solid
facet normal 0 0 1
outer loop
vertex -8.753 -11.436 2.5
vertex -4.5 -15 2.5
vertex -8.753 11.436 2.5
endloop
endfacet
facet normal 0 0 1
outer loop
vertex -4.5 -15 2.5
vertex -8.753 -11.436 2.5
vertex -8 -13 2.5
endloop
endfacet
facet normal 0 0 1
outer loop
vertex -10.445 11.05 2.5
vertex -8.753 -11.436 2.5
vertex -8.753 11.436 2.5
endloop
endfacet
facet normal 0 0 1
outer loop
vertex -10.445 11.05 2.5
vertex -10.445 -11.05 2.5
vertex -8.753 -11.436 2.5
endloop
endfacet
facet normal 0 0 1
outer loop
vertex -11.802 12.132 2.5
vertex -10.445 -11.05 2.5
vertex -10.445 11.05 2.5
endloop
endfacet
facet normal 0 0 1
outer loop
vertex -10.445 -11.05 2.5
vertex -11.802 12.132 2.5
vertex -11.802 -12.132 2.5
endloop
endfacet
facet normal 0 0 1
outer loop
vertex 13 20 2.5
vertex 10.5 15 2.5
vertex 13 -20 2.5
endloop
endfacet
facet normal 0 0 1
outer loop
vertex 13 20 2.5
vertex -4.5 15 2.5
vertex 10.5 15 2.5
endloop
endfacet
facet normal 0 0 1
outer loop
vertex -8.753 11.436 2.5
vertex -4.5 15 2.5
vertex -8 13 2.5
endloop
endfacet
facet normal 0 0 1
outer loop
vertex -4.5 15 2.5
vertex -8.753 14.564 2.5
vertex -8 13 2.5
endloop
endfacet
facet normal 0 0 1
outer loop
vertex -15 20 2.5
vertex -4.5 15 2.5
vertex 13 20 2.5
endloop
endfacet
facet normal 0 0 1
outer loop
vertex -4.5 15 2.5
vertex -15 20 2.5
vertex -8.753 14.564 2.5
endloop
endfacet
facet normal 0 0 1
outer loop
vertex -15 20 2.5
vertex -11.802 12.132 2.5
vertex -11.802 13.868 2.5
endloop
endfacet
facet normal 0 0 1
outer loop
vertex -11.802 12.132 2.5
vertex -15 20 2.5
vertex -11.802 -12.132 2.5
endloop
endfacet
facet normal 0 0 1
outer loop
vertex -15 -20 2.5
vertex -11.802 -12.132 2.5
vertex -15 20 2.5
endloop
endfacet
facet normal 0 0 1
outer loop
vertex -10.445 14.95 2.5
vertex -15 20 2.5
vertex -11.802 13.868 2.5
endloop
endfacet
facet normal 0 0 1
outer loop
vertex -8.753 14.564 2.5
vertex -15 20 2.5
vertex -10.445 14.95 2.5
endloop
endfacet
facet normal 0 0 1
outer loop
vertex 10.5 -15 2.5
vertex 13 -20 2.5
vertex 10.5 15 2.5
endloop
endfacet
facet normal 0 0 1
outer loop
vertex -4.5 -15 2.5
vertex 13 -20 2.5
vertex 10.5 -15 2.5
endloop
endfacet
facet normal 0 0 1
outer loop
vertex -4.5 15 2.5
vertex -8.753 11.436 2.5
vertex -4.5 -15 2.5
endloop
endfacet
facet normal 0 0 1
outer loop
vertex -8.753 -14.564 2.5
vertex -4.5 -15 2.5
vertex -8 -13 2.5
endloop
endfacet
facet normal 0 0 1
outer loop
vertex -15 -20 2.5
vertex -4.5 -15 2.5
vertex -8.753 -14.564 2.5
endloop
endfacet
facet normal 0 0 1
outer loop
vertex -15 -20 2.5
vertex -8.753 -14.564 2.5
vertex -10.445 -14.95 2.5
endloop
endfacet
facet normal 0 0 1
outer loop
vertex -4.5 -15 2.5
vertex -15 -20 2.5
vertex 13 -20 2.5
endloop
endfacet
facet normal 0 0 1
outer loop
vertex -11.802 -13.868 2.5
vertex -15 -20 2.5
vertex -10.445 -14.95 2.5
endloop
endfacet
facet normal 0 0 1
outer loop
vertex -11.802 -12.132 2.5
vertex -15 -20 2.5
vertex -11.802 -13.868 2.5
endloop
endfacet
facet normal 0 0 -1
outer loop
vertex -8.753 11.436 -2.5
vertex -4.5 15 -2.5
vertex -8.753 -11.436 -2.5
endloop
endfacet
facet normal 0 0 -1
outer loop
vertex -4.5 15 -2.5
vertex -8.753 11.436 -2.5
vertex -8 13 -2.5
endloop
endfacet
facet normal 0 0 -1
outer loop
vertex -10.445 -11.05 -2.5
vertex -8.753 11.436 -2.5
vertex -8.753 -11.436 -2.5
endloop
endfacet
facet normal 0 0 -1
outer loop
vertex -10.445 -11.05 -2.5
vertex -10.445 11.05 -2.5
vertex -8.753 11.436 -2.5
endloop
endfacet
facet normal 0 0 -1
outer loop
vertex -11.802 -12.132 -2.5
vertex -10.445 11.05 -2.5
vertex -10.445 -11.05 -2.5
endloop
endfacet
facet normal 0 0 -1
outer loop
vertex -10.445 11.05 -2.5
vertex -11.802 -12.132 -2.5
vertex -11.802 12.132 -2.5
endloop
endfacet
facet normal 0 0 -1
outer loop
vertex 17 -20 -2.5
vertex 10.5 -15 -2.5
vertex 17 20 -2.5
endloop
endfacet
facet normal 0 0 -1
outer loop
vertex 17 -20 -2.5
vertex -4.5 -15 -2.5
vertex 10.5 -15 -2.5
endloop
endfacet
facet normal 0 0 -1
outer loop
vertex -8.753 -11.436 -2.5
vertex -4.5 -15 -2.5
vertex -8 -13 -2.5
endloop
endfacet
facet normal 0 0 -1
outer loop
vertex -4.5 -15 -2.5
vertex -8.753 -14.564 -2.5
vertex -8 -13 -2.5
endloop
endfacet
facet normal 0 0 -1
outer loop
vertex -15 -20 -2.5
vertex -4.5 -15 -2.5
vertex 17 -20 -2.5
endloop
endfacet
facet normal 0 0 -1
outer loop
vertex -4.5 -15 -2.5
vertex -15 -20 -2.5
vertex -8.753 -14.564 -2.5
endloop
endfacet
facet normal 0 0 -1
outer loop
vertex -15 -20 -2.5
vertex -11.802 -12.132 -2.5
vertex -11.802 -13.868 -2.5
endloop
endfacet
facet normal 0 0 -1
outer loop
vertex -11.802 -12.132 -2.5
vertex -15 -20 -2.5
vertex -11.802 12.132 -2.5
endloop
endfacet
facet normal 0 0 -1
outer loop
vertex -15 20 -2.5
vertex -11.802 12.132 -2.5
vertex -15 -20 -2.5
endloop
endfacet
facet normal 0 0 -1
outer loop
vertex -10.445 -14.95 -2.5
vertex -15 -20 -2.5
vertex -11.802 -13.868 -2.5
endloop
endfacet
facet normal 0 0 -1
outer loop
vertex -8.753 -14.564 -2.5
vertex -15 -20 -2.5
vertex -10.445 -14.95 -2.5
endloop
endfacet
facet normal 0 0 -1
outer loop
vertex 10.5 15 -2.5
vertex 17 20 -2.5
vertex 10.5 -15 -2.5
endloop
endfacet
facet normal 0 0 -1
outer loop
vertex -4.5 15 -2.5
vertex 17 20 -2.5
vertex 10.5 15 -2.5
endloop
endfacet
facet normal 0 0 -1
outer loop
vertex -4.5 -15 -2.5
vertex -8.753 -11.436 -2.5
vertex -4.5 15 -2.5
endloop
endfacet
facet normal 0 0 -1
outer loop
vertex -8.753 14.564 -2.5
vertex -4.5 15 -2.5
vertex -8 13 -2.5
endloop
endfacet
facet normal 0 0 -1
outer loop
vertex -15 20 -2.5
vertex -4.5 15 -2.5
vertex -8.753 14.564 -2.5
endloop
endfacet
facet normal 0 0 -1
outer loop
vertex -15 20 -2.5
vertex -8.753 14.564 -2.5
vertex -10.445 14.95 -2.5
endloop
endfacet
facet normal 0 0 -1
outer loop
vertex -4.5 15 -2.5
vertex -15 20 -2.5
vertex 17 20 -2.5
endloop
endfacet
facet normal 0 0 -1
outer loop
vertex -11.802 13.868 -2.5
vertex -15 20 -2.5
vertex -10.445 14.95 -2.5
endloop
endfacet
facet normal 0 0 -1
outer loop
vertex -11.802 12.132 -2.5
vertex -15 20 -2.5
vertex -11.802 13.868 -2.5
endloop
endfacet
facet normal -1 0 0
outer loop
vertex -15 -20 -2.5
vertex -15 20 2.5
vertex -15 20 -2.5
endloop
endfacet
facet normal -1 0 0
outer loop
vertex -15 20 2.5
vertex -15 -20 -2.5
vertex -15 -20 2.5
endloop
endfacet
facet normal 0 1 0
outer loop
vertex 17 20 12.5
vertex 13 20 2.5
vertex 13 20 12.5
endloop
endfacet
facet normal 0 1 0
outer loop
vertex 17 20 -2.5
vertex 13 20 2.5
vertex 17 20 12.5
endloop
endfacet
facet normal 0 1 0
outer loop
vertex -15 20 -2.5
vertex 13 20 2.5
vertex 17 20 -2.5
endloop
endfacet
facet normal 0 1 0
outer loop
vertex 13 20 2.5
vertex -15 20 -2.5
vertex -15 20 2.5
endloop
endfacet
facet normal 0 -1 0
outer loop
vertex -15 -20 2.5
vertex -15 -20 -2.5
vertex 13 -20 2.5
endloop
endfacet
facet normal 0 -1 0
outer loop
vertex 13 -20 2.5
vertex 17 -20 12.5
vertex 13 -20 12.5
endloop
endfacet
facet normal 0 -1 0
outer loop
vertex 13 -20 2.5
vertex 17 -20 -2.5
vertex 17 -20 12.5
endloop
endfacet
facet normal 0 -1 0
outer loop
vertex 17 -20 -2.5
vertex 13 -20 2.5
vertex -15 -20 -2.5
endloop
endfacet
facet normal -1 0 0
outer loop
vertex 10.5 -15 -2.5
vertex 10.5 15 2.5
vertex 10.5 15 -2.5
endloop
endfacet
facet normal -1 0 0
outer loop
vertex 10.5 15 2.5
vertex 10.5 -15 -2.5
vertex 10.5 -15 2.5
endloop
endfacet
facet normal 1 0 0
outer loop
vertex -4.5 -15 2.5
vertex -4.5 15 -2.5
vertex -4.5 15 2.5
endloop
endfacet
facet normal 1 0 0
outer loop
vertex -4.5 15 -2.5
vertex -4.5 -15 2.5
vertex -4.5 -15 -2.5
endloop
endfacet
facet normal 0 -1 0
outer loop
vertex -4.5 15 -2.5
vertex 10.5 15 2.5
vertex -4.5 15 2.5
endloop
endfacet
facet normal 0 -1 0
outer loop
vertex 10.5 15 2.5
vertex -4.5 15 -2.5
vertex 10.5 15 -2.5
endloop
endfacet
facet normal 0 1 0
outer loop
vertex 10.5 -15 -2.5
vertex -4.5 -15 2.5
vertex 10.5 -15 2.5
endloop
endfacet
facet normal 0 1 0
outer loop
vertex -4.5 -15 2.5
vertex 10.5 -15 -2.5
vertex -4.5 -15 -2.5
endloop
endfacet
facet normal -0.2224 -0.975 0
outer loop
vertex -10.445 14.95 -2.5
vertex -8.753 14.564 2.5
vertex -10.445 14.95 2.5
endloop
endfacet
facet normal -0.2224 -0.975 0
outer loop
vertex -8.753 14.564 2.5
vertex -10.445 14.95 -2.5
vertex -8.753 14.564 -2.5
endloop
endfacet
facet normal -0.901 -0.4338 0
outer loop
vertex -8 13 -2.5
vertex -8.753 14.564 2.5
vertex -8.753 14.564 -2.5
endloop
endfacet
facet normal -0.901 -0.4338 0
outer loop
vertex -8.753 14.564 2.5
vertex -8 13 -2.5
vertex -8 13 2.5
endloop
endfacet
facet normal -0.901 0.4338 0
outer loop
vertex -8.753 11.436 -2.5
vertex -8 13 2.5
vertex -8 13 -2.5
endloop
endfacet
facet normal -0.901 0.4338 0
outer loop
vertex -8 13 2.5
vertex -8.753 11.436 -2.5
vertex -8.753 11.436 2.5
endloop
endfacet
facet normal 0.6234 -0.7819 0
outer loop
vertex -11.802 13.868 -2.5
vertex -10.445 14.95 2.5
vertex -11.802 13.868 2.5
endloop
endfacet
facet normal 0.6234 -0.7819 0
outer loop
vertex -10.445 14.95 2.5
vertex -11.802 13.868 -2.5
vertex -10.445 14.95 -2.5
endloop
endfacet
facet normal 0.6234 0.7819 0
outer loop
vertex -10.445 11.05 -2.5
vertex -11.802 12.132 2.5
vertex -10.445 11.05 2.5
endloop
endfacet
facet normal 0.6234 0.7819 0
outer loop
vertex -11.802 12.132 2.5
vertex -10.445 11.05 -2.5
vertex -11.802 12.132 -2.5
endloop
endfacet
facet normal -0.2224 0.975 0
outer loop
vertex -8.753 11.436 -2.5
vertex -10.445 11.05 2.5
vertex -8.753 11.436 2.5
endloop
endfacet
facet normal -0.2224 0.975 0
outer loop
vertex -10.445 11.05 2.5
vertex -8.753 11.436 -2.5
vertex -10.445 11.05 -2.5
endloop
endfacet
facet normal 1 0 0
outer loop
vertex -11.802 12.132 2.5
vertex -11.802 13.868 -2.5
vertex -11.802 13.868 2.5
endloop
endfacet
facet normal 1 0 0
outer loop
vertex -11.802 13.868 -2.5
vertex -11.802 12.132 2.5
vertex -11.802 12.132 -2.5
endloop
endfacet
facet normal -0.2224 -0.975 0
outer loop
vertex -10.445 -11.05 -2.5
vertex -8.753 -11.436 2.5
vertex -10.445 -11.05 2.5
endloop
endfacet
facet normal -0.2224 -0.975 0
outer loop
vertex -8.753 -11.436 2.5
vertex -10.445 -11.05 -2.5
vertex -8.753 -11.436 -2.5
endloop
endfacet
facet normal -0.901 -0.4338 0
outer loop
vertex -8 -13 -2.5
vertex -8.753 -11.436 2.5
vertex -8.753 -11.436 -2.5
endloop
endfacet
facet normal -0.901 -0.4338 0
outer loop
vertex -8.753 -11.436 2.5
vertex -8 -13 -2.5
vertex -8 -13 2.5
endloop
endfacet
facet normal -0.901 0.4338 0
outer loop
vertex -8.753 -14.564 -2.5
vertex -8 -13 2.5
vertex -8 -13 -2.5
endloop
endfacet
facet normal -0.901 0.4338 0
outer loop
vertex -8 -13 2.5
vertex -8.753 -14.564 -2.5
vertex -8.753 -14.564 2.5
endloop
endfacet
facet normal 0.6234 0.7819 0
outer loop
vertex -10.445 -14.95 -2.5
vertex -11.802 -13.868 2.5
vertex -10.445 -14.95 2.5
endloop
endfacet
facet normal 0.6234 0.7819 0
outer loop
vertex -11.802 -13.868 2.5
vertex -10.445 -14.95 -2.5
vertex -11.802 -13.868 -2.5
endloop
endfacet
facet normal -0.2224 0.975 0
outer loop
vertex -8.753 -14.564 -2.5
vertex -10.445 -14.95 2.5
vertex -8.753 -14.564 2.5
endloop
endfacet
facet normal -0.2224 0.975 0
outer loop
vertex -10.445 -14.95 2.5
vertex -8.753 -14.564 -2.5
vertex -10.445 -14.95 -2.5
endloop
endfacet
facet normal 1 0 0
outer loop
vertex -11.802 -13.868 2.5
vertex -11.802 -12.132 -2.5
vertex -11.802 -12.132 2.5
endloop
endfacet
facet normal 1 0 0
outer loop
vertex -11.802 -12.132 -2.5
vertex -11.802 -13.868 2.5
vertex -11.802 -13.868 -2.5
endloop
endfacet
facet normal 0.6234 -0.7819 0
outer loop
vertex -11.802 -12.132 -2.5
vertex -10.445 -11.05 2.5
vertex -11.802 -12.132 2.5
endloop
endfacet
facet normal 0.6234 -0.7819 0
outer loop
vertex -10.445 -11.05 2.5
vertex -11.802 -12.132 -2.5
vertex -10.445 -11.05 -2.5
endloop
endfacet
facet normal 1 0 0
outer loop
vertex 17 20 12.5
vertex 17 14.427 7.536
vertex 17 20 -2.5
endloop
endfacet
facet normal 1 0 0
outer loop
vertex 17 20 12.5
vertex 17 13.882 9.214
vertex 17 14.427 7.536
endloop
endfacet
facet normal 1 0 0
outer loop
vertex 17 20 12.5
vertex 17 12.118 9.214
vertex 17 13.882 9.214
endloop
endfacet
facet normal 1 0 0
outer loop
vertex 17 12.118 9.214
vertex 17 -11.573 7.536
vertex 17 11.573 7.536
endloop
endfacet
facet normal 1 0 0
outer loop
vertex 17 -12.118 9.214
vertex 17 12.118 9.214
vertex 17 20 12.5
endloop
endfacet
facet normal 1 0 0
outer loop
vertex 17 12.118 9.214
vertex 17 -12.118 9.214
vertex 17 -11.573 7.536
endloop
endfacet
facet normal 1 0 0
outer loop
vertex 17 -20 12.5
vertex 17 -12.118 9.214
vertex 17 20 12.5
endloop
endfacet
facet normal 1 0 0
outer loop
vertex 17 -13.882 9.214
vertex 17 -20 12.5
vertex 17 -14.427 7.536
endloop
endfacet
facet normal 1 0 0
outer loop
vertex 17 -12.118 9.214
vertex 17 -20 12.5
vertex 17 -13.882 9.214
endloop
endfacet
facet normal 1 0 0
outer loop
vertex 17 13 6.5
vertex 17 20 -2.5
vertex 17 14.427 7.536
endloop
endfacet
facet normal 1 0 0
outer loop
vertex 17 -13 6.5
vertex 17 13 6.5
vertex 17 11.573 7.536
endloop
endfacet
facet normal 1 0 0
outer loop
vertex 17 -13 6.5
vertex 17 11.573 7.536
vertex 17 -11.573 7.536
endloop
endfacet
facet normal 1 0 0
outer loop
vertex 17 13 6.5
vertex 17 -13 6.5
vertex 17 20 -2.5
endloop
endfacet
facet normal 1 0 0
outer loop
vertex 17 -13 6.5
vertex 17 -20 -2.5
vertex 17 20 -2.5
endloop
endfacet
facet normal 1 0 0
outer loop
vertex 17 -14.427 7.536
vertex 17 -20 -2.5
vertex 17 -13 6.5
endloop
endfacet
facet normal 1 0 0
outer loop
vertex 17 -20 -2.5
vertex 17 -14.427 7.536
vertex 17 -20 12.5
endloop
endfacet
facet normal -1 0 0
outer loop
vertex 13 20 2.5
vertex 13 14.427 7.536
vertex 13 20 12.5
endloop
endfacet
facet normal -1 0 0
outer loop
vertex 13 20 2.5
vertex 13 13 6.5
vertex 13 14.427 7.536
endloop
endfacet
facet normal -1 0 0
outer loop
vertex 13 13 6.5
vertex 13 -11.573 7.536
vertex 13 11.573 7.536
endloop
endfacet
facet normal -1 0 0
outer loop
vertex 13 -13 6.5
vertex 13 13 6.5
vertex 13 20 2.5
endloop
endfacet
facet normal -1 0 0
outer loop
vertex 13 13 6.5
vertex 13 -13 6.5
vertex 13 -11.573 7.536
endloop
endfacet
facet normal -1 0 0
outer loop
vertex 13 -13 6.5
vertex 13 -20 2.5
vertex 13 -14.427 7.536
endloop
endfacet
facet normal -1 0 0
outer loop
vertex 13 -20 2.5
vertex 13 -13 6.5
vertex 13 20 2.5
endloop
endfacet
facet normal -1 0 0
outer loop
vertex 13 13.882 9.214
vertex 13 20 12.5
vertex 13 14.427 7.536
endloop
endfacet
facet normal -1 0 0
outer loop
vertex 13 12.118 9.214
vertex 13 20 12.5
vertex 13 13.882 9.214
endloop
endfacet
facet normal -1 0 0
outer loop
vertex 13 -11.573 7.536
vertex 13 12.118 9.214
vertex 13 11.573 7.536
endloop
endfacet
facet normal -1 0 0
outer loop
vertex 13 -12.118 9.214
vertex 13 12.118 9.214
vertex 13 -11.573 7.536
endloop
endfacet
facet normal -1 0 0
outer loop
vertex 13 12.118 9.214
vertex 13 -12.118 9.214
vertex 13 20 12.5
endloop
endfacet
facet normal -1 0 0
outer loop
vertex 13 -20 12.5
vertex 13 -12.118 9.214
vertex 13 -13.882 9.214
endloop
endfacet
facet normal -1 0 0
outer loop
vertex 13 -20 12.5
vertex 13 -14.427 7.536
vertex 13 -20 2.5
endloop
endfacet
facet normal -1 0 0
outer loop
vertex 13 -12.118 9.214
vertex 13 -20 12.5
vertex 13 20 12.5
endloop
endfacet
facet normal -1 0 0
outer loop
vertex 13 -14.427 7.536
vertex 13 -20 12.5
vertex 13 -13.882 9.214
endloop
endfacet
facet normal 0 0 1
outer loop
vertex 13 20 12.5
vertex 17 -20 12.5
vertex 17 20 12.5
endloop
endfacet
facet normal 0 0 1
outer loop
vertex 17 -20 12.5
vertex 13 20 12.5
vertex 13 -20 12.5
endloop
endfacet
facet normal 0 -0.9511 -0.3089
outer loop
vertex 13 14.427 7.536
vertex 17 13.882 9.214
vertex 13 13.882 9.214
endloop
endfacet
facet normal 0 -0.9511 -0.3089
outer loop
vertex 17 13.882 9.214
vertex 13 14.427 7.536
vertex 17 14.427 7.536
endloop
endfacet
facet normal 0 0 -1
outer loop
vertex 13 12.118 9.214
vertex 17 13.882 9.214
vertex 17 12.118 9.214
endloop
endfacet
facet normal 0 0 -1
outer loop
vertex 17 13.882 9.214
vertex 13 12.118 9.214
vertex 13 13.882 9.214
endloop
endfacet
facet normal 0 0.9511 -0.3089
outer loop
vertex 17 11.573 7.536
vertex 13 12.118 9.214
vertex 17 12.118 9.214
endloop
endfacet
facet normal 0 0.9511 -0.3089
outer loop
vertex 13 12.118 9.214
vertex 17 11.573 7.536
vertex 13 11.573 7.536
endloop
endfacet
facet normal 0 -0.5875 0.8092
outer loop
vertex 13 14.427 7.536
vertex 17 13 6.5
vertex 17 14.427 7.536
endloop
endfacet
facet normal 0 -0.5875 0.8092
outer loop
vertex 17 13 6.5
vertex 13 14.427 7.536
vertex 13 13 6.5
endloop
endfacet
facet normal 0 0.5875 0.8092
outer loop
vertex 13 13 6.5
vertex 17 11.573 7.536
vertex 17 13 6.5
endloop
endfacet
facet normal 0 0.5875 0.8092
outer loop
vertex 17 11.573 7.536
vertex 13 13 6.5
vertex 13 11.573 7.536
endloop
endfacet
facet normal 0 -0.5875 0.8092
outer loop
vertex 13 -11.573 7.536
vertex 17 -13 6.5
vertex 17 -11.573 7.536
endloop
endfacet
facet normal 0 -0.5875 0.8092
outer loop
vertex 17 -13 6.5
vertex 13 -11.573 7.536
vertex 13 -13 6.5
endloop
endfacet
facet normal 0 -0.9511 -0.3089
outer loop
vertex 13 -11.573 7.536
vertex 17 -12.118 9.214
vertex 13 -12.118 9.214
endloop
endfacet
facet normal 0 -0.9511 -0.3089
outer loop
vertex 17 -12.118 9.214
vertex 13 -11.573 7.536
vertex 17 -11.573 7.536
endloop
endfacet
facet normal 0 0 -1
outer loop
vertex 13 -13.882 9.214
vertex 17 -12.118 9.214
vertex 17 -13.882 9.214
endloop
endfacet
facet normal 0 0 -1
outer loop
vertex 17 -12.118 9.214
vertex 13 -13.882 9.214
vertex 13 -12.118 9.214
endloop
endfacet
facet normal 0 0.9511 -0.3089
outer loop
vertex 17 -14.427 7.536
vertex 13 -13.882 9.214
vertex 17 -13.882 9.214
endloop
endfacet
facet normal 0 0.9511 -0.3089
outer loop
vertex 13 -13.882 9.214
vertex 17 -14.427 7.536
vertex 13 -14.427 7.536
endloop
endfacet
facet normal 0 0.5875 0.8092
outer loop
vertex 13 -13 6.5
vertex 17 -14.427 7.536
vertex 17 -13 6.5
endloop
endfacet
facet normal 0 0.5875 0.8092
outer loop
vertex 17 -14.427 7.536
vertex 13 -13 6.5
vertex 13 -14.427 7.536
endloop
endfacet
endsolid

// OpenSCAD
//Wade extruder holder by 3dmakers
// it keeps extruder at springs side 

difference() 
{
	cube([30, 40, 5], center = true);
	translate([3, 0, 0]) cube([15, 30, 6], center = true);
	translate([-10, 13, 0]) cylinder(h = 6, r = 2, center = true);
	translate([-10, -13, 0]) cylinder(h = 6, r = 2, center = true);
}

difference() 
{
	translate([15, 0,5]) rotate([0, 90, 0])cube([15, 40, 4], center = true);
	rotate([0, 90, 0]) translate([-8, 13, 15]) cylinder(h = 6, r = 1.5, center = true);
	rotate([0, 90, 0])translate([-8, -13, 15]) cylinder(h = 6, r = 1.5, center = true);

}
